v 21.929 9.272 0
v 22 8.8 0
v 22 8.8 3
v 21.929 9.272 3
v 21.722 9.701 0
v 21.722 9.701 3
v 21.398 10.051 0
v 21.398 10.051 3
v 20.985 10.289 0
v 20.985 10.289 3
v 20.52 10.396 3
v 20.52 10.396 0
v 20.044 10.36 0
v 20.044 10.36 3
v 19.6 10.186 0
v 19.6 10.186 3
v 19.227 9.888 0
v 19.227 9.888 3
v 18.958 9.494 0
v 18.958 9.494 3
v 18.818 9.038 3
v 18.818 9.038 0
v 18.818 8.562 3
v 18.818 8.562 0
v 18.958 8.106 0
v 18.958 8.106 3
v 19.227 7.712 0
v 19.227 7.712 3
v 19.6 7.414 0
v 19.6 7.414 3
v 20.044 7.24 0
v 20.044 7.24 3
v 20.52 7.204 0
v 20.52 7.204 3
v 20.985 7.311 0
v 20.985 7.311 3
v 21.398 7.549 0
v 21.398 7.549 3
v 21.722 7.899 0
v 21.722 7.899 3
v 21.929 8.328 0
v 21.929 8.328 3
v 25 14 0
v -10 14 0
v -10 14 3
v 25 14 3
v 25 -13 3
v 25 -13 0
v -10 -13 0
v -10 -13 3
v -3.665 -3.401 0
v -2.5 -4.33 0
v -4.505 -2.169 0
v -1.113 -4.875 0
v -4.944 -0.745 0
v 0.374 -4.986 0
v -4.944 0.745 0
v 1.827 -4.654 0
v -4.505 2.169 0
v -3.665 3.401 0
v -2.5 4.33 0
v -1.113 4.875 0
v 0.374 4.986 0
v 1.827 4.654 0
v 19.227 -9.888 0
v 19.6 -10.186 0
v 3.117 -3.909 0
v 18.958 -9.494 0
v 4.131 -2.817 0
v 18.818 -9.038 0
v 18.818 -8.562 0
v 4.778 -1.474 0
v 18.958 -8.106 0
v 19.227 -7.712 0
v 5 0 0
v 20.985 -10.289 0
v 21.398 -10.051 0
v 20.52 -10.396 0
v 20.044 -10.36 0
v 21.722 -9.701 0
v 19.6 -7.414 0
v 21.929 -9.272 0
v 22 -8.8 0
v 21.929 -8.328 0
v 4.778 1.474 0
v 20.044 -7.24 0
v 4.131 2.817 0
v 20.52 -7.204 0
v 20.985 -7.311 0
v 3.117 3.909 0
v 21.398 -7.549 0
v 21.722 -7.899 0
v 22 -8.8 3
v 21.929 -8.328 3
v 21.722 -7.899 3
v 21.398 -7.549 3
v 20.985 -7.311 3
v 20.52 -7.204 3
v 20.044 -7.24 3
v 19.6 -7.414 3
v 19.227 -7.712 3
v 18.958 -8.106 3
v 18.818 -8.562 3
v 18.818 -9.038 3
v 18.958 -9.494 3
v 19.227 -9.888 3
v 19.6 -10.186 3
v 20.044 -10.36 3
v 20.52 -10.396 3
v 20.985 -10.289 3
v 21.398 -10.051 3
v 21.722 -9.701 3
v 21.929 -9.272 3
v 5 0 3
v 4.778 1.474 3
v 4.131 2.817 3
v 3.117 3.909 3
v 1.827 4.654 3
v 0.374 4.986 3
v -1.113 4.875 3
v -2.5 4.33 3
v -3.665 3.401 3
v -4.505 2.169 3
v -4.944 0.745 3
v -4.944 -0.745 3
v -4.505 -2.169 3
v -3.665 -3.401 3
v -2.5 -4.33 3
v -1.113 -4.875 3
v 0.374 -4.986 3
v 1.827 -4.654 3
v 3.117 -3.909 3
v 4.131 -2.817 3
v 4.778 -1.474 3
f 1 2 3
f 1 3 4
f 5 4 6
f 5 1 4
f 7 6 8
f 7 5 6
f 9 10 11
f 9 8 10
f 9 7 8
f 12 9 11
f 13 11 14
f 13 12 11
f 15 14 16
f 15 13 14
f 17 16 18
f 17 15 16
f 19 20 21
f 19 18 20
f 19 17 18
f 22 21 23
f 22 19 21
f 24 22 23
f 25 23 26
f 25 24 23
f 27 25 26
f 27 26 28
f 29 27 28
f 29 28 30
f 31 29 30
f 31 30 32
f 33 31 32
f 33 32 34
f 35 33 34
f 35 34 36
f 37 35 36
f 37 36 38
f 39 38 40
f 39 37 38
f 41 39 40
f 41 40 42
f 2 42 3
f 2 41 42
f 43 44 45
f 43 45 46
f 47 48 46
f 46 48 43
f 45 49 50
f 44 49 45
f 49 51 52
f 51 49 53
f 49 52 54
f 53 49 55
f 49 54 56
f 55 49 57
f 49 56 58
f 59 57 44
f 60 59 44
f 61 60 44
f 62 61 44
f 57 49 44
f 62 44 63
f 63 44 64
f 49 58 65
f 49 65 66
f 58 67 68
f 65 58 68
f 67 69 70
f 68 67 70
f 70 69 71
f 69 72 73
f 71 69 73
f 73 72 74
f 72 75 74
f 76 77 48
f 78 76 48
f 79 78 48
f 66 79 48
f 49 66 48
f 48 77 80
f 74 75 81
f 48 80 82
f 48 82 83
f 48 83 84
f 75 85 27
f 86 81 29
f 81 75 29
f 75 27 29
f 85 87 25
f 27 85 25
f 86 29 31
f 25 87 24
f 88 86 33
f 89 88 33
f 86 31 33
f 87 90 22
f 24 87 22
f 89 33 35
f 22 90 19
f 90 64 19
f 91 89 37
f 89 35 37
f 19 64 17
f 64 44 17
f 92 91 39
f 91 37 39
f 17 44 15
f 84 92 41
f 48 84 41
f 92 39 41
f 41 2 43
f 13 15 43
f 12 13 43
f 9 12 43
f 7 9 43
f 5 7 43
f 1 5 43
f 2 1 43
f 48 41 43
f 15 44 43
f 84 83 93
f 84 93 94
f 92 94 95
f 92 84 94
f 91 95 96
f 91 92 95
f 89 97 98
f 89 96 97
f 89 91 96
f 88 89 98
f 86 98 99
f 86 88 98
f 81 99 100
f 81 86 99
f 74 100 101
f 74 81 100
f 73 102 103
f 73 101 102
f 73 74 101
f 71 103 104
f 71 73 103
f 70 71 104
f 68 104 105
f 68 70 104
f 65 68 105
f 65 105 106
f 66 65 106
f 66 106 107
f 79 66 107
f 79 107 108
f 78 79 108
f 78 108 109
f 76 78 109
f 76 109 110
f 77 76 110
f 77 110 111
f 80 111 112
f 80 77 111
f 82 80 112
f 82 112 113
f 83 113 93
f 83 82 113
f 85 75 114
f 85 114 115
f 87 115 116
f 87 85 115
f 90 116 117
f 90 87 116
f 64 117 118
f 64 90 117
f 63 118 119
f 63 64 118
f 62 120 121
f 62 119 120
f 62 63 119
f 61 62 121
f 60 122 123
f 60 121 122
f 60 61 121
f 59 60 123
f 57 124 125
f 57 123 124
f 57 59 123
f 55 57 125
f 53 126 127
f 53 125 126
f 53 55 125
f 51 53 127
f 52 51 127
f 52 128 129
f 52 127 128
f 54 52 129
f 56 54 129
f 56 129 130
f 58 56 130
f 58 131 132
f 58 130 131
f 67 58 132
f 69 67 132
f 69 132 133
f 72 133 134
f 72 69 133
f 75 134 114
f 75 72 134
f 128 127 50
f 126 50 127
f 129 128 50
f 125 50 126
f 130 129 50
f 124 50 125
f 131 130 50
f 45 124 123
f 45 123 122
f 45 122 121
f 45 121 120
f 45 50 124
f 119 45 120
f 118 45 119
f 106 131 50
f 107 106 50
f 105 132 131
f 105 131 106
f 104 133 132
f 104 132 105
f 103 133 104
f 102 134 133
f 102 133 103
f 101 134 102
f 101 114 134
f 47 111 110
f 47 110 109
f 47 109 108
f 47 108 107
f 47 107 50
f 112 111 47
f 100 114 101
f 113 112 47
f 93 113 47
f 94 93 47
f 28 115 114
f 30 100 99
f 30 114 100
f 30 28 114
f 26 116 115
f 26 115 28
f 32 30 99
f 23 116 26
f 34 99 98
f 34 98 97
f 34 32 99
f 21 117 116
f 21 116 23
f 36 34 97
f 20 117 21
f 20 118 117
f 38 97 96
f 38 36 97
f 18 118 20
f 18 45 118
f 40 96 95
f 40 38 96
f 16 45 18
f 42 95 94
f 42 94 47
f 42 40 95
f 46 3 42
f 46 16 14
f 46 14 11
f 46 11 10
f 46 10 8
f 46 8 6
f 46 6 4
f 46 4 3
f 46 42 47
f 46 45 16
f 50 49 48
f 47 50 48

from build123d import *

# Parameters (mm, degrees)
CYLINDER030_R     = 1.6
CYLINDER030_DEPTH = 50
CYLINDER029_R     = 5
CYLINDER029_DEPTH = 22.5
CYLINDER031_R     = 1.6
CYLINDER031_DEPTH = 50
BOX019_W          = 35
BOX019_H          = 27
BOX019_DEPTH      = 3


with BuildPart() as cylinder030:
    # Cylinder030 → Cylinder030 (new body)
    with BuildSketch(Plane(origin=(20.4, 8.8, -22), x_dir=(1, 0, 0), z_dir=(0, 0, 1))):
        Circle(CYLINDER030_R)
    extrude(amount=CYLINDER030_DEPTH)


with BuildPart() as fusion034:
    # Cylinder029 → Cylinder029 (new body)
    with BuildSketch(Plane.XY.offset(-12)):
        Circle(CYLINDER029_R)
    extrude(amount=CYLINDER029_DEPTH)

    # Fusion034: union Cylinder030
    add(cylinder030.part)


with BuildPart() as motor_holes_y:
    # Cylinder031 → Cylinder031 (new body)
    with BuildSketch(Plane(origin=(20.4, -8.8, -22), x_dir=(1, 0, 0), z_dir=(0, 0, 1))):
        Circle(CYLINDER031_R)
    extrude(amount=CYLINDER031_DEPTH)

    # Fusion036: union Fusion034
    add(fusion034.part)


with BuildPart() as motor_spacer:
    # Box019 → Box019 (new body)
    with BuildSketch(Plane(origin=(-10, -13, 0), x_dir=(1, 0, 0), z_dir=(0, 0, 1))):
        with Locations((17.5, 13.5)):
            Rectangle(BOX019_W, BOX019_H)
    extrude(amount=BOX019_DEPTH)

    # Cut030: cut motor-holes-y
    add(motor_holes_y.part, mode=Mode.SUBTRACT)


solid = motor_spacer.part
